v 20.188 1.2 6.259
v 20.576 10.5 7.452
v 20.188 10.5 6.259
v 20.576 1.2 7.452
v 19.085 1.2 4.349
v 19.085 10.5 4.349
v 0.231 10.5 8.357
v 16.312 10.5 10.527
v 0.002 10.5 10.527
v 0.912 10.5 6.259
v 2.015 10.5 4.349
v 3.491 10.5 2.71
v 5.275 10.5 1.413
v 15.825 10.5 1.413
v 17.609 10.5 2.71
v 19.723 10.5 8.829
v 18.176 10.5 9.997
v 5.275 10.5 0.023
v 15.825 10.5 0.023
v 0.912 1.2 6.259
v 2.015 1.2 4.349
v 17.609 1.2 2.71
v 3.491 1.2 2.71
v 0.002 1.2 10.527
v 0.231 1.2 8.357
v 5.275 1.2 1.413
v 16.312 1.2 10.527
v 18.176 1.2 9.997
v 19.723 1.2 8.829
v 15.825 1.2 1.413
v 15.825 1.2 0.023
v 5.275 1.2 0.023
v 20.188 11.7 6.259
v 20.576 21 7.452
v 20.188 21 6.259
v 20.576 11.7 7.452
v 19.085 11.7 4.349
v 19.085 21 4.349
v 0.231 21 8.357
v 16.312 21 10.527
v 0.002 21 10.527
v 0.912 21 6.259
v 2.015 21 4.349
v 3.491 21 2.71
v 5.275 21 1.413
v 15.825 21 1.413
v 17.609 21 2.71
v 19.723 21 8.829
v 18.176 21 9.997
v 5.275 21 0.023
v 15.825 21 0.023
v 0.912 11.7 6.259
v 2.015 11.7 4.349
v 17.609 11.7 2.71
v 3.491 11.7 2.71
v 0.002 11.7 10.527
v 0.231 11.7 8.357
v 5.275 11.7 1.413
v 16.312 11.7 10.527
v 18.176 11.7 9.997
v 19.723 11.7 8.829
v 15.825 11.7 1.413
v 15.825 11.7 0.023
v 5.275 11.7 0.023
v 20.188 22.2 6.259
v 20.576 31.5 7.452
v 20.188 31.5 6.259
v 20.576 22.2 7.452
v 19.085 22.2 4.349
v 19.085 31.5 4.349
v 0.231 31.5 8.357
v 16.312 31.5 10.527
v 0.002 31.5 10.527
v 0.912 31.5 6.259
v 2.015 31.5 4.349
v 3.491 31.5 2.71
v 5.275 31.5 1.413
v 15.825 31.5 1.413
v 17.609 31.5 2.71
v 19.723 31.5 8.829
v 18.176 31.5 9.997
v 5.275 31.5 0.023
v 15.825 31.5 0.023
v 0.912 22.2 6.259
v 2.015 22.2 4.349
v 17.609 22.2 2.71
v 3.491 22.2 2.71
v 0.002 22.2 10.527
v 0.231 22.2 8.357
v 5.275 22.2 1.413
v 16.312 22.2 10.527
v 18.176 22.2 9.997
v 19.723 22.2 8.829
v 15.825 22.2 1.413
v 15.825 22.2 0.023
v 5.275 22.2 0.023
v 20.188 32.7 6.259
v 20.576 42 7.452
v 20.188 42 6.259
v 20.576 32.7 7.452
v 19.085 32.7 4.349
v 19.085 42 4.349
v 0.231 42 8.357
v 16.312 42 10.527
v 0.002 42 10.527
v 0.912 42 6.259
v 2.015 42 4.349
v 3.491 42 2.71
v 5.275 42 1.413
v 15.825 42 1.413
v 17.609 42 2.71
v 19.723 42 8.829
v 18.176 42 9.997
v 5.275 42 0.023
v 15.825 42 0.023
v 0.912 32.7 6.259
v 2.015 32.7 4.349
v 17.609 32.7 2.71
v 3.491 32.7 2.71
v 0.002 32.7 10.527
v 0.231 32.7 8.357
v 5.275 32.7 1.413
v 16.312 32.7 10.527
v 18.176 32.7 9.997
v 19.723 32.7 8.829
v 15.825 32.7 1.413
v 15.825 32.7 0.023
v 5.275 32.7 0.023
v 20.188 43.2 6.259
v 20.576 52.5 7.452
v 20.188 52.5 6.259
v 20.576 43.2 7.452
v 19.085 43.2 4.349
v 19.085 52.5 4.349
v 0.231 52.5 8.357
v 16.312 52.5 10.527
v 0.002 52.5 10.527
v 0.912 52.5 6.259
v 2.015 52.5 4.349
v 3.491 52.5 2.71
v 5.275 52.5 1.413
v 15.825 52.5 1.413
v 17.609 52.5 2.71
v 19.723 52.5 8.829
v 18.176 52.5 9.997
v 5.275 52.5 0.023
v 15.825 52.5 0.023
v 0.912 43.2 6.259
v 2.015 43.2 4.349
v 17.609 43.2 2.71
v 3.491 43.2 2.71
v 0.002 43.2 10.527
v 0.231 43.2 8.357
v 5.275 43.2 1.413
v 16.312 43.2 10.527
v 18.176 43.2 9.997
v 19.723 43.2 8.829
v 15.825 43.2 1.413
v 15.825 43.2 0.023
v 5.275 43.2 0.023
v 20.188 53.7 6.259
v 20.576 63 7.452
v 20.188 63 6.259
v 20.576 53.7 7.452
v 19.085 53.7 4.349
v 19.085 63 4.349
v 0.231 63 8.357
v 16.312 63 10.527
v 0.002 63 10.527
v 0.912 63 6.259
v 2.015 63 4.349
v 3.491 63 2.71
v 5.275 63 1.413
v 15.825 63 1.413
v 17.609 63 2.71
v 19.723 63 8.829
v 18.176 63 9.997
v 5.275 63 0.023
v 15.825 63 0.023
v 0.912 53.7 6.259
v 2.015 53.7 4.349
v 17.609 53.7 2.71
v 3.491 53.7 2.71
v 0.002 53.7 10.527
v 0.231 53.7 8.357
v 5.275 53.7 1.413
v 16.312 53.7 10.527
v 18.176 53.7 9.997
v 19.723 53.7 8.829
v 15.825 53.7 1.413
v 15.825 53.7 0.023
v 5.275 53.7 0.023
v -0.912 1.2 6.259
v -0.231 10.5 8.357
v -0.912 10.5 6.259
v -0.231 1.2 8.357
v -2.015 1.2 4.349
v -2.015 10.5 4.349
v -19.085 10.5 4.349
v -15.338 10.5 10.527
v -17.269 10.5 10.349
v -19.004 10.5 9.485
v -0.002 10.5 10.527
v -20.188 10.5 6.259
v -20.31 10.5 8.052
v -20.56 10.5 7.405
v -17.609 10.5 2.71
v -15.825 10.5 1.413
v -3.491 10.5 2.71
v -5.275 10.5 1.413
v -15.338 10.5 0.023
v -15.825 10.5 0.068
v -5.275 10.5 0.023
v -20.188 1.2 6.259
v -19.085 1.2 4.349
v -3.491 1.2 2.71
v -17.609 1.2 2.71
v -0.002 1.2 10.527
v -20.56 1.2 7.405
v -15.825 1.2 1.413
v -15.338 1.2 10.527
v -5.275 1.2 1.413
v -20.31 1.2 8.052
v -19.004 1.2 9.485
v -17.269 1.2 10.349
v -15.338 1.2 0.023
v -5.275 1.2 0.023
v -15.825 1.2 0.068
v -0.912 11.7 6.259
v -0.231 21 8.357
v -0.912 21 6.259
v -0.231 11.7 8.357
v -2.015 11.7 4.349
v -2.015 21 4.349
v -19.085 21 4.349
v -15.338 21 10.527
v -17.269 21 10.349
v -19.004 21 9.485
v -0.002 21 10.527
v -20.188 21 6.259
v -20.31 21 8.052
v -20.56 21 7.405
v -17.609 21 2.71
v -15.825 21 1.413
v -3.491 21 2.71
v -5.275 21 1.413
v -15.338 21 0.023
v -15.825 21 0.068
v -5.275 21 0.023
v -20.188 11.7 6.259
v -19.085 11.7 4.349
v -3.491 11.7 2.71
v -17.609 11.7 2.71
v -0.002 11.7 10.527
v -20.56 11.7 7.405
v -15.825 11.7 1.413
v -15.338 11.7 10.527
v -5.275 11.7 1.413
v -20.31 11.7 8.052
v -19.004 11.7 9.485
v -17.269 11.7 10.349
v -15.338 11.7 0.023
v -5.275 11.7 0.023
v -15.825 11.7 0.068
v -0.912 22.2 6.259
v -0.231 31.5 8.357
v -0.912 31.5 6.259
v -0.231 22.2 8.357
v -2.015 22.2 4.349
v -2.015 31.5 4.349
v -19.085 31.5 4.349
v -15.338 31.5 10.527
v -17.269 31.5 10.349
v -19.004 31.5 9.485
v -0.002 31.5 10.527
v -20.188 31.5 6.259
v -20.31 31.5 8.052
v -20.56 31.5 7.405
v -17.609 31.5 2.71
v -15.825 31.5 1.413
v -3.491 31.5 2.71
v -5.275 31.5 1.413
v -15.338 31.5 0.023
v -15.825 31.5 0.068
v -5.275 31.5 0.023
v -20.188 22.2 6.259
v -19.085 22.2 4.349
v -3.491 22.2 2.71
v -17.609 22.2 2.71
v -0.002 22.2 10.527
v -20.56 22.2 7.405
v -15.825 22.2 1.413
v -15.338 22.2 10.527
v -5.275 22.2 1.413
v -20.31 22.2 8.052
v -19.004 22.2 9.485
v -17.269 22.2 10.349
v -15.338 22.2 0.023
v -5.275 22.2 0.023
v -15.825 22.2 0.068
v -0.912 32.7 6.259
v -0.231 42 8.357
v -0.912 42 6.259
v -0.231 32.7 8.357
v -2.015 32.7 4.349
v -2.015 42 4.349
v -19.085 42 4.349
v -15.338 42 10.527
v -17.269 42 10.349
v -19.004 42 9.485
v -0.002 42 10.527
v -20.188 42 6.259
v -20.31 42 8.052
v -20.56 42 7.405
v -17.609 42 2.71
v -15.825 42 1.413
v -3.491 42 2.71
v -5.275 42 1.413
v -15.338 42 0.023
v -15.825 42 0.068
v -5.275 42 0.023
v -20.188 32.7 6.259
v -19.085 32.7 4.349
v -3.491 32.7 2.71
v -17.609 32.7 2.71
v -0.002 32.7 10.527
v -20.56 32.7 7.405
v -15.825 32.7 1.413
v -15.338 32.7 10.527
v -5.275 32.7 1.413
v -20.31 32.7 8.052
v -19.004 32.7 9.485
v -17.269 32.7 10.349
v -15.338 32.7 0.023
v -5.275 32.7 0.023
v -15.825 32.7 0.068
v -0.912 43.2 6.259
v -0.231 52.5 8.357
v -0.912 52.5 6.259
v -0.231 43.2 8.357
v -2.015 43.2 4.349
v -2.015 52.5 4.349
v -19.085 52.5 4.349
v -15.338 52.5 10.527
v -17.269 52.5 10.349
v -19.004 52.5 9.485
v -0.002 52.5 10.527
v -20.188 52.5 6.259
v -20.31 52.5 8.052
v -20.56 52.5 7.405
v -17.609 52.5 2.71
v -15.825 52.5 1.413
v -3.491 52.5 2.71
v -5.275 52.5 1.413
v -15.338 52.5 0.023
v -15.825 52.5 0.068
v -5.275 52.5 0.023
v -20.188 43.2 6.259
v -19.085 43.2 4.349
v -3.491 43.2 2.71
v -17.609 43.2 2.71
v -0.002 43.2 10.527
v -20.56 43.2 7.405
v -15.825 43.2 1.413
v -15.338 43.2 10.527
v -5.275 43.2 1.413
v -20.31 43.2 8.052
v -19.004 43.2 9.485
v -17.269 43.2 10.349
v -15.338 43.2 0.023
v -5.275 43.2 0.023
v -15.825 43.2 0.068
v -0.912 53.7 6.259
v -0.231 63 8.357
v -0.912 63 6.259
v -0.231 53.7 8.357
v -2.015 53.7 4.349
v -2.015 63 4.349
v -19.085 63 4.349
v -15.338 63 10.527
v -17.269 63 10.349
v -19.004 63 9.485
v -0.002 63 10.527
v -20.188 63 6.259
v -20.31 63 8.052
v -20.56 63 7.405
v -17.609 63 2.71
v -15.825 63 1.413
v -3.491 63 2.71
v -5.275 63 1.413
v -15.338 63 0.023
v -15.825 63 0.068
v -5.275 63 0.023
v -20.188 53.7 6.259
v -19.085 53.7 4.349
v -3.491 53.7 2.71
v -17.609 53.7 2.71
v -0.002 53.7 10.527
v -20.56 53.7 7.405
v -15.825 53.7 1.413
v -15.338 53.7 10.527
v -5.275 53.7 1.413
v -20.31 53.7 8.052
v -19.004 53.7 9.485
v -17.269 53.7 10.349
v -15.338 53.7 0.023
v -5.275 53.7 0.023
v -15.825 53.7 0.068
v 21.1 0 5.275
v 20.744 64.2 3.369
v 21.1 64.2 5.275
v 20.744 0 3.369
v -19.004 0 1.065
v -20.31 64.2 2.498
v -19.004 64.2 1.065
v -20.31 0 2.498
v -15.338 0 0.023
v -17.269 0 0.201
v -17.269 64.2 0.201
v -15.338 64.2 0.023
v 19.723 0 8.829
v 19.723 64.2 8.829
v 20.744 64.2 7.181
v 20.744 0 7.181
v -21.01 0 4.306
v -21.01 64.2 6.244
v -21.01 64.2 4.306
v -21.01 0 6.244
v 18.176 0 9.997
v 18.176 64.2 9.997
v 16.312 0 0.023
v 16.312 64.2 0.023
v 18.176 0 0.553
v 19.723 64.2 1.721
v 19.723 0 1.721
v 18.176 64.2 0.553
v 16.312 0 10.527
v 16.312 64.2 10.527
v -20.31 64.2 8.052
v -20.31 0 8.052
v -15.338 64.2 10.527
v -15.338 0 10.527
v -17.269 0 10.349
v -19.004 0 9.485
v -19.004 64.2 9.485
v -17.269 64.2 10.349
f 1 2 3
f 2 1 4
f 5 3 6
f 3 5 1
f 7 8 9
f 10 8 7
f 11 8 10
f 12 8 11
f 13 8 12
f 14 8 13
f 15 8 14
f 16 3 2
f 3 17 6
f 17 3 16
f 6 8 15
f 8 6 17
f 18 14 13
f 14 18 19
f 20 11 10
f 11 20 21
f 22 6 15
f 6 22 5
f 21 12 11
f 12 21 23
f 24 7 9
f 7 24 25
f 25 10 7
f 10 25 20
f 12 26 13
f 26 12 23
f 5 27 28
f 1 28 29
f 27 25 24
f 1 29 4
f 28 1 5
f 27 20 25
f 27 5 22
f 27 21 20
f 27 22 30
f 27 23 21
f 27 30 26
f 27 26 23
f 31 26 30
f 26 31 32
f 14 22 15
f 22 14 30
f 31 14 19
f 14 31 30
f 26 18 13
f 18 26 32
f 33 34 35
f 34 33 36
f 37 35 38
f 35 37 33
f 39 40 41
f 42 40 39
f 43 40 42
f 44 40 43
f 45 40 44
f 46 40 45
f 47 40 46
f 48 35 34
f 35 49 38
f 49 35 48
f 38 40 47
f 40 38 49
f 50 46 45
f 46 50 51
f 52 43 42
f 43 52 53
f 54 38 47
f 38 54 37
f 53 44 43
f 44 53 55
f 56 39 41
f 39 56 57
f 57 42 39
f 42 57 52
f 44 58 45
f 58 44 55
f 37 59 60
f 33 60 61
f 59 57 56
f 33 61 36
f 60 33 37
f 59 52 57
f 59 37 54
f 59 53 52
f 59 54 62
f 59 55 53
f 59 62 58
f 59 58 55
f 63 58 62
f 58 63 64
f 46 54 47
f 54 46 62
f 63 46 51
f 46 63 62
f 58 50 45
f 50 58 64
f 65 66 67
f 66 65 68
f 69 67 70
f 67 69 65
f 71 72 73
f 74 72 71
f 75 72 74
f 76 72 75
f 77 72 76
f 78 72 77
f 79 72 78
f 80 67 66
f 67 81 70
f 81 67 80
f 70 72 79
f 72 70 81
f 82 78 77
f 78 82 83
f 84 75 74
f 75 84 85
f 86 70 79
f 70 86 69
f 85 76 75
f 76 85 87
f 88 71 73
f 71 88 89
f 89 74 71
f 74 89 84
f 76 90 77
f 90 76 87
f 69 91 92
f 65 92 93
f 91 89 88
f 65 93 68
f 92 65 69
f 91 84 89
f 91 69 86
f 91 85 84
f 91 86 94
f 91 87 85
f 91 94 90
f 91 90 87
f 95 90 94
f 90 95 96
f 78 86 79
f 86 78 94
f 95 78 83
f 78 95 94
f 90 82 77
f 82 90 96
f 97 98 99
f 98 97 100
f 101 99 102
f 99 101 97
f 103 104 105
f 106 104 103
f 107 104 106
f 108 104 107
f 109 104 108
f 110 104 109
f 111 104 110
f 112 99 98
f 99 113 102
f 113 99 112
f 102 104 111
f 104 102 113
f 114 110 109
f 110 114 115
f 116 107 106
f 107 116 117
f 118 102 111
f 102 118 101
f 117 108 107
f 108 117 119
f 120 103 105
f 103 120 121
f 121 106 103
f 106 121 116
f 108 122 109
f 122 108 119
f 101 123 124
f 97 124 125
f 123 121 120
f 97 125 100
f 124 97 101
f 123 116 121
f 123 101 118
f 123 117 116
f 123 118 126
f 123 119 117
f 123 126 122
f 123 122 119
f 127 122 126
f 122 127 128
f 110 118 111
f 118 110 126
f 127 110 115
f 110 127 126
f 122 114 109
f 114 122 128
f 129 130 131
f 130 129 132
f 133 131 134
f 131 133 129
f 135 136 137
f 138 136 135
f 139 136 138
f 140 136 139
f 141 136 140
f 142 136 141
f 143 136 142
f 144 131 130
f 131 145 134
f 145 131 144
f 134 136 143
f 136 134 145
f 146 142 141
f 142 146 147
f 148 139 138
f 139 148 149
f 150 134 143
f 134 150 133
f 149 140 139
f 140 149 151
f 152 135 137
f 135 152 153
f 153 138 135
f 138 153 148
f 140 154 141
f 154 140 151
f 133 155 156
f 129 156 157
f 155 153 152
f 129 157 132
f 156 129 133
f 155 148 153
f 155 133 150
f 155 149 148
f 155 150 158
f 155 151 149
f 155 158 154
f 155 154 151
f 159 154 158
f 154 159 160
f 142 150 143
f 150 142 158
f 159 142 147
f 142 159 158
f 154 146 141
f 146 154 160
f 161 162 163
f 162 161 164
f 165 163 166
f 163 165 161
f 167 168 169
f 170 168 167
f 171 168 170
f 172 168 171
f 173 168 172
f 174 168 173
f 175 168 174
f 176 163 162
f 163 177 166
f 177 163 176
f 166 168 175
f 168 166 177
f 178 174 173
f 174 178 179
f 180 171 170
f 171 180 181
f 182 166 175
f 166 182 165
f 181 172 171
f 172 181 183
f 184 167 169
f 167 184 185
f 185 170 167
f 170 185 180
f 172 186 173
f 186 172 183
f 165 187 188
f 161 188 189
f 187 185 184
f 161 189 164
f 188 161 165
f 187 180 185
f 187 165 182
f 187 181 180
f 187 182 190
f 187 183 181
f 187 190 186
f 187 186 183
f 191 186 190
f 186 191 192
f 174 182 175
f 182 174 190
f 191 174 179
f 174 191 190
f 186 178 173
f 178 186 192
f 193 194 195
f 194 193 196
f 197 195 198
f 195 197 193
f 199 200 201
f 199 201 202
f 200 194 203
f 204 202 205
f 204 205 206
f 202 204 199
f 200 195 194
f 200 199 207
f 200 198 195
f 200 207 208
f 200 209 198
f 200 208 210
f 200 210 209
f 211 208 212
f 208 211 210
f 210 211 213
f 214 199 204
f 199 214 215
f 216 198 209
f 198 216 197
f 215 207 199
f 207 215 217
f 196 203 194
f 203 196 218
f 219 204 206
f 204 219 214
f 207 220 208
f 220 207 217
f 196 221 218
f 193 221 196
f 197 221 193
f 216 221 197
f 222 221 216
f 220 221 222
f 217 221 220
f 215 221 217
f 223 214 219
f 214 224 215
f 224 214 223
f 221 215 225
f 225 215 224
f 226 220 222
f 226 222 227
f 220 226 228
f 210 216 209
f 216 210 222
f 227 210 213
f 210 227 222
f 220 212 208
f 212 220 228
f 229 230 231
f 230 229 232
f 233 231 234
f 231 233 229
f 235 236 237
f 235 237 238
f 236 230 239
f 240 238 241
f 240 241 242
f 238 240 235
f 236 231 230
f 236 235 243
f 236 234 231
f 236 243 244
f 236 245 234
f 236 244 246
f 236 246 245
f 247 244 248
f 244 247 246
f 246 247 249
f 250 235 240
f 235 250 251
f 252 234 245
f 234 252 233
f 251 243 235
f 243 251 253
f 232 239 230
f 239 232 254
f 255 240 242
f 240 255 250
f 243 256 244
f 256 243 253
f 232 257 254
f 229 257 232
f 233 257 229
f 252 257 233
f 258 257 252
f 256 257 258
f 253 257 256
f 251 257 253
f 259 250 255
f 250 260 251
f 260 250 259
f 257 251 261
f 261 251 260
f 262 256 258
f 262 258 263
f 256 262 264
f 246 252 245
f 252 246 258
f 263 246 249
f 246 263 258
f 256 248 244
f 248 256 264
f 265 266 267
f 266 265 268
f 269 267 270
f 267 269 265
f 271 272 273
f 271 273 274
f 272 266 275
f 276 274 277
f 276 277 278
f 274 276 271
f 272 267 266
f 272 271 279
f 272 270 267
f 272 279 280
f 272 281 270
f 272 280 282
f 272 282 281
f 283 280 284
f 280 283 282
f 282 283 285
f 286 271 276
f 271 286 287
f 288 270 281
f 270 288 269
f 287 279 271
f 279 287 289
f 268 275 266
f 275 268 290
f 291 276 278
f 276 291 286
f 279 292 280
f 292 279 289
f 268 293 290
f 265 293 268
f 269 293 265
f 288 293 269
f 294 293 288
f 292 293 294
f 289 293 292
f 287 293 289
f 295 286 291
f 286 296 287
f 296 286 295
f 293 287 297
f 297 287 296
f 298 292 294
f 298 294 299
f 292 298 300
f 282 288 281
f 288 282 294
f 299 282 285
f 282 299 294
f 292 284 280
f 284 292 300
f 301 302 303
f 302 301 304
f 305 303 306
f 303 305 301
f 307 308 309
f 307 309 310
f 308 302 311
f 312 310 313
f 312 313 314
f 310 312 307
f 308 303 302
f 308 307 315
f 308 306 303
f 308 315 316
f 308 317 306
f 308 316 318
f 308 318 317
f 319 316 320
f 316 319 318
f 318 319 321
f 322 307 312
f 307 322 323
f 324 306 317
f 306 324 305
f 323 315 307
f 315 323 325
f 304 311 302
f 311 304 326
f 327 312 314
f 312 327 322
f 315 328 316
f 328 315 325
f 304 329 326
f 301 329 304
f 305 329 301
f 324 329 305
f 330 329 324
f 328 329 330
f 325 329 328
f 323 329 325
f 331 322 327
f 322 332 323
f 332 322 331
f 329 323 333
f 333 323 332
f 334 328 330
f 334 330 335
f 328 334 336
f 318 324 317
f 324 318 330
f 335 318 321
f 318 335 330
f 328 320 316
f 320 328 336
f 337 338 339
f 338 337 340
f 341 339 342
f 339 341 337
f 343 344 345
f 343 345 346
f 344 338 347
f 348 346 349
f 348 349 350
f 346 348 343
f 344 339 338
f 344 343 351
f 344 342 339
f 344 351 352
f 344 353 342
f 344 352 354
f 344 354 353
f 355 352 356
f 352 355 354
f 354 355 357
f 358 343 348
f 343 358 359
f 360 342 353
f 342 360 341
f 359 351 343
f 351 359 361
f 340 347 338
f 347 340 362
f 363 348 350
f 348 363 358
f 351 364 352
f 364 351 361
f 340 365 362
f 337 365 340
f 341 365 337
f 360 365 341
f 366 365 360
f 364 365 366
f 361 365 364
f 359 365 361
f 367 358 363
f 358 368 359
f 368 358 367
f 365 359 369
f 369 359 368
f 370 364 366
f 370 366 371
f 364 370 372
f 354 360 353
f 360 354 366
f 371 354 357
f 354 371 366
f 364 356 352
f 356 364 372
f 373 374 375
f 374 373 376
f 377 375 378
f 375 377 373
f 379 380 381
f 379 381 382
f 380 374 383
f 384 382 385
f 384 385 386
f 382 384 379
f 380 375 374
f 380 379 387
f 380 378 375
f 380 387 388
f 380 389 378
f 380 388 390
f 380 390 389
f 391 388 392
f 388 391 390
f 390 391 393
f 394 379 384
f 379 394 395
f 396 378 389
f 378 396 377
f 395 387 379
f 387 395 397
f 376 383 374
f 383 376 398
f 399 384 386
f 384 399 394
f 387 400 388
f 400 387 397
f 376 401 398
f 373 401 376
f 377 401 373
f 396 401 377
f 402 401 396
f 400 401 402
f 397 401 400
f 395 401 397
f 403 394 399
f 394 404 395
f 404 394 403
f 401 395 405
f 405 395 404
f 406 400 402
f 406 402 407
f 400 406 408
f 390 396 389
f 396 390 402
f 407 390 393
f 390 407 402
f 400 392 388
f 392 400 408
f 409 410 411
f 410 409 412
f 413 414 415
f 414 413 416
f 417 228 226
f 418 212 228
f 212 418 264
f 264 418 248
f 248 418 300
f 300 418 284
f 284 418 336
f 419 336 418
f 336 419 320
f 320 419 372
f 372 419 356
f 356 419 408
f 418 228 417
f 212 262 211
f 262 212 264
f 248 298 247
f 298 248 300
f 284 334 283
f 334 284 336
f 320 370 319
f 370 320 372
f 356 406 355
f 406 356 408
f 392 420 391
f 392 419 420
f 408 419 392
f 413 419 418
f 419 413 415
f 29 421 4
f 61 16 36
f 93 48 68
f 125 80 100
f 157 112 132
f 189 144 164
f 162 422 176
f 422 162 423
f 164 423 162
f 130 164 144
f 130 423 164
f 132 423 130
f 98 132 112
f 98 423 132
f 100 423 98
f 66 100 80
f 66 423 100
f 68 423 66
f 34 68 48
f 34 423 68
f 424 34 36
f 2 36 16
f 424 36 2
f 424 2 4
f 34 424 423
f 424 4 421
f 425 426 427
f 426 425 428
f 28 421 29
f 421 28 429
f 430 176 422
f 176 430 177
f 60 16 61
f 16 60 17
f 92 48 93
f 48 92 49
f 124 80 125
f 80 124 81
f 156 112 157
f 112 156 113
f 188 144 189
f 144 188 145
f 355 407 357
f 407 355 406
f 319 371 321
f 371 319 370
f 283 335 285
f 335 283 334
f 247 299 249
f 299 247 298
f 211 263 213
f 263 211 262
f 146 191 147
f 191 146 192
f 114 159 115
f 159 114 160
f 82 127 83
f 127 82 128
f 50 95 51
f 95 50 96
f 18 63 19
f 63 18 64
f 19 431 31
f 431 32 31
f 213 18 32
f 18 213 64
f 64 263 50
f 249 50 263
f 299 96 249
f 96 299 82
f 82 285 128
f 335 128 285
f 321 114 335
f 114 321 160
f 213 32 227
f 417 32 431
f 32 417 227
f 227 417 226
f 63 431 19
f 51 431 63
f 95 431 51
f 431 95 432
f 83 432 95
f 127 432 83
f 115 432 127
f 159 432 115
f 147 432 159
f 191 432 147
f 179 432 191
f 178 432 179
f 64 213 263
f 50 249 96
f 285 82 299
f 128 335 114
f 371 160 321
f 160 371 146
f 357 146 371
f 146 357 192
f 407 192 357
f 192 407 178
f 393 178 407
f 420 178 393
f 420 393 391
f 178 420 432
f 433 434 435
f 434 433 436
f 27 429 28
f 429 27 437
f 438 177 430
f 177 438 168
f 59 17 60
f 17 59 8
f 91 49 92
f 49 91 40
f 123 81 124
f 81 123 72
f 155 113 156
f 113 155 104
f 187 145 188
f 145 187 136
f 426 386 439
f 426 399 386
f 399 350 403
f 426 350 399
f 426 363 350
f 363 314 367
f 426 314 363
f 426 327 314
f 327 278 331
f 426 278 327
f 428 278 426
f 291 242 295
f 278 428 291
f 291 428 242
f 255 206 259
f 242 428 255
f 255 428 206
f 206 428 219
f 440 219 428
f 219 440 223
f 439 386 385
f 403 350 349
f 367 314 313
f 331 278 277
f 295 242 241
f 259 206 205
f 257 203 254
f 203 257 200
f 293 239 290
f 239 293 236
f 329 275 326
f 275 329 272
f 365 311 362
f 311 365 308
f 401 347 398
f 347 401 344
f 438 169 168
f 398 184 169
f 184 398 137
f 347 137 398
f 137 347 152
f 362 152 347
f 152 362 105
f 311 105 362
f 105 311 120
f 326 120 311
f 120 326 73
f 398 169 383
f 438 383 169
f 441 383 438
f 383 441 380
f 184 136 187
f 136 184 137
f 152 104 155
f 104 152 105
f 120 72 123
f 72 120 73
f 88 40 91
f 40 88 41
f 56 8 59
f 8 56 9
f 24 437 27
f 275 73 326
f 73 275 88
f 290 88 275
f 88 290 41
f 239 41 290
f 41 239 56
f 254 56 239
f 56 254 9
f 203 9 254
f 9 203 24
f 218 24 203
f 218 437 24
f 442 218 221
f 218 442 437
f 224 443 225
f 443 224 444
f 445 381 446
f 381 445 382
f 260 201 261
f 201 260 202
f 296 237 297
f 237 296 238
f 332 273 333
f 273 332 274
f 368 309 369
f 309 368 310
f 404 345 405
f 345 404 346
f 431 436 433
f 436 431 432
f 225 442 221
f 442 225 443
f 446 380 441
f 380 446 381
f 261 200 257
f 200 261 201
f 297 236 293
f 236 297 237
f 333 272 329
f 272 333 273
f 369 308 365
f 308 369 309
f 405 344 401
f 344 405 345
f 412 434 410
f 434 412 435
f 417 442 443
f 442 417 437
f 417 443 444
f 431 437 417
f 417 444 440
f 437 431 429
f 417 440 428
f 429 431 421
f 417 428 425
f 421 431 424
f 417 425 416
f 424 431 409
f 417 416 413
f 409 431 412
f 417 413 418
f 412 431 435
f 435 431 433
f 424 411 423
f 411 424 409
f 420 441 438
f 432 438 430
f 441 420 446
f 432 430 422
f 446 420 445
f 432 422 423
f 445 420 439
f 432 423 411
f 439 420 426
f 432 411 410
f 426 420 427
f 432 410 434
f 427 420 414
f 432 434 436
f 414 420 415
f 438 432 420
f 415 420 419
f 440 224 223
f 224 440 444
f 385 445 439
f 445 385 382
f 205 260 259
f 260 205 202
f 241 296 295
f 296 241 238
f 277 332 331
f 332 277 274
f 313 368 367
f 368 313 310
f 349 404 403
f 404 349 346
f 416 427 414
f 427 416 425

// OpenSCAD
d = 21.1;   // bobbin diameter
w = 9.3;    // bobbin width
r = 6;      // number of rows
minW = 1.2;

module spule(){
translate([0, 0, d/2]) rotate([90, 0, 0]) cylinder(w, d/2, d/2, true);
cube([d/2, w, d], true);
};

module spulen()
for(x = [d/2, -d/2], y = [0:r+1]) 
    translate([x, y * (w + minW) + minW + w/2]) spule();

module cylind()
rotate([-90, 0, 0]) cylinder(r * (w+minW) + minW, d/4, d/4);
    
difference(){
    hull(){
        translate([d*0.75, 0, d/4]) cylind();
        translate([-d*0.75, 0, d/4]) cylind();
    };
    spulen();
}
